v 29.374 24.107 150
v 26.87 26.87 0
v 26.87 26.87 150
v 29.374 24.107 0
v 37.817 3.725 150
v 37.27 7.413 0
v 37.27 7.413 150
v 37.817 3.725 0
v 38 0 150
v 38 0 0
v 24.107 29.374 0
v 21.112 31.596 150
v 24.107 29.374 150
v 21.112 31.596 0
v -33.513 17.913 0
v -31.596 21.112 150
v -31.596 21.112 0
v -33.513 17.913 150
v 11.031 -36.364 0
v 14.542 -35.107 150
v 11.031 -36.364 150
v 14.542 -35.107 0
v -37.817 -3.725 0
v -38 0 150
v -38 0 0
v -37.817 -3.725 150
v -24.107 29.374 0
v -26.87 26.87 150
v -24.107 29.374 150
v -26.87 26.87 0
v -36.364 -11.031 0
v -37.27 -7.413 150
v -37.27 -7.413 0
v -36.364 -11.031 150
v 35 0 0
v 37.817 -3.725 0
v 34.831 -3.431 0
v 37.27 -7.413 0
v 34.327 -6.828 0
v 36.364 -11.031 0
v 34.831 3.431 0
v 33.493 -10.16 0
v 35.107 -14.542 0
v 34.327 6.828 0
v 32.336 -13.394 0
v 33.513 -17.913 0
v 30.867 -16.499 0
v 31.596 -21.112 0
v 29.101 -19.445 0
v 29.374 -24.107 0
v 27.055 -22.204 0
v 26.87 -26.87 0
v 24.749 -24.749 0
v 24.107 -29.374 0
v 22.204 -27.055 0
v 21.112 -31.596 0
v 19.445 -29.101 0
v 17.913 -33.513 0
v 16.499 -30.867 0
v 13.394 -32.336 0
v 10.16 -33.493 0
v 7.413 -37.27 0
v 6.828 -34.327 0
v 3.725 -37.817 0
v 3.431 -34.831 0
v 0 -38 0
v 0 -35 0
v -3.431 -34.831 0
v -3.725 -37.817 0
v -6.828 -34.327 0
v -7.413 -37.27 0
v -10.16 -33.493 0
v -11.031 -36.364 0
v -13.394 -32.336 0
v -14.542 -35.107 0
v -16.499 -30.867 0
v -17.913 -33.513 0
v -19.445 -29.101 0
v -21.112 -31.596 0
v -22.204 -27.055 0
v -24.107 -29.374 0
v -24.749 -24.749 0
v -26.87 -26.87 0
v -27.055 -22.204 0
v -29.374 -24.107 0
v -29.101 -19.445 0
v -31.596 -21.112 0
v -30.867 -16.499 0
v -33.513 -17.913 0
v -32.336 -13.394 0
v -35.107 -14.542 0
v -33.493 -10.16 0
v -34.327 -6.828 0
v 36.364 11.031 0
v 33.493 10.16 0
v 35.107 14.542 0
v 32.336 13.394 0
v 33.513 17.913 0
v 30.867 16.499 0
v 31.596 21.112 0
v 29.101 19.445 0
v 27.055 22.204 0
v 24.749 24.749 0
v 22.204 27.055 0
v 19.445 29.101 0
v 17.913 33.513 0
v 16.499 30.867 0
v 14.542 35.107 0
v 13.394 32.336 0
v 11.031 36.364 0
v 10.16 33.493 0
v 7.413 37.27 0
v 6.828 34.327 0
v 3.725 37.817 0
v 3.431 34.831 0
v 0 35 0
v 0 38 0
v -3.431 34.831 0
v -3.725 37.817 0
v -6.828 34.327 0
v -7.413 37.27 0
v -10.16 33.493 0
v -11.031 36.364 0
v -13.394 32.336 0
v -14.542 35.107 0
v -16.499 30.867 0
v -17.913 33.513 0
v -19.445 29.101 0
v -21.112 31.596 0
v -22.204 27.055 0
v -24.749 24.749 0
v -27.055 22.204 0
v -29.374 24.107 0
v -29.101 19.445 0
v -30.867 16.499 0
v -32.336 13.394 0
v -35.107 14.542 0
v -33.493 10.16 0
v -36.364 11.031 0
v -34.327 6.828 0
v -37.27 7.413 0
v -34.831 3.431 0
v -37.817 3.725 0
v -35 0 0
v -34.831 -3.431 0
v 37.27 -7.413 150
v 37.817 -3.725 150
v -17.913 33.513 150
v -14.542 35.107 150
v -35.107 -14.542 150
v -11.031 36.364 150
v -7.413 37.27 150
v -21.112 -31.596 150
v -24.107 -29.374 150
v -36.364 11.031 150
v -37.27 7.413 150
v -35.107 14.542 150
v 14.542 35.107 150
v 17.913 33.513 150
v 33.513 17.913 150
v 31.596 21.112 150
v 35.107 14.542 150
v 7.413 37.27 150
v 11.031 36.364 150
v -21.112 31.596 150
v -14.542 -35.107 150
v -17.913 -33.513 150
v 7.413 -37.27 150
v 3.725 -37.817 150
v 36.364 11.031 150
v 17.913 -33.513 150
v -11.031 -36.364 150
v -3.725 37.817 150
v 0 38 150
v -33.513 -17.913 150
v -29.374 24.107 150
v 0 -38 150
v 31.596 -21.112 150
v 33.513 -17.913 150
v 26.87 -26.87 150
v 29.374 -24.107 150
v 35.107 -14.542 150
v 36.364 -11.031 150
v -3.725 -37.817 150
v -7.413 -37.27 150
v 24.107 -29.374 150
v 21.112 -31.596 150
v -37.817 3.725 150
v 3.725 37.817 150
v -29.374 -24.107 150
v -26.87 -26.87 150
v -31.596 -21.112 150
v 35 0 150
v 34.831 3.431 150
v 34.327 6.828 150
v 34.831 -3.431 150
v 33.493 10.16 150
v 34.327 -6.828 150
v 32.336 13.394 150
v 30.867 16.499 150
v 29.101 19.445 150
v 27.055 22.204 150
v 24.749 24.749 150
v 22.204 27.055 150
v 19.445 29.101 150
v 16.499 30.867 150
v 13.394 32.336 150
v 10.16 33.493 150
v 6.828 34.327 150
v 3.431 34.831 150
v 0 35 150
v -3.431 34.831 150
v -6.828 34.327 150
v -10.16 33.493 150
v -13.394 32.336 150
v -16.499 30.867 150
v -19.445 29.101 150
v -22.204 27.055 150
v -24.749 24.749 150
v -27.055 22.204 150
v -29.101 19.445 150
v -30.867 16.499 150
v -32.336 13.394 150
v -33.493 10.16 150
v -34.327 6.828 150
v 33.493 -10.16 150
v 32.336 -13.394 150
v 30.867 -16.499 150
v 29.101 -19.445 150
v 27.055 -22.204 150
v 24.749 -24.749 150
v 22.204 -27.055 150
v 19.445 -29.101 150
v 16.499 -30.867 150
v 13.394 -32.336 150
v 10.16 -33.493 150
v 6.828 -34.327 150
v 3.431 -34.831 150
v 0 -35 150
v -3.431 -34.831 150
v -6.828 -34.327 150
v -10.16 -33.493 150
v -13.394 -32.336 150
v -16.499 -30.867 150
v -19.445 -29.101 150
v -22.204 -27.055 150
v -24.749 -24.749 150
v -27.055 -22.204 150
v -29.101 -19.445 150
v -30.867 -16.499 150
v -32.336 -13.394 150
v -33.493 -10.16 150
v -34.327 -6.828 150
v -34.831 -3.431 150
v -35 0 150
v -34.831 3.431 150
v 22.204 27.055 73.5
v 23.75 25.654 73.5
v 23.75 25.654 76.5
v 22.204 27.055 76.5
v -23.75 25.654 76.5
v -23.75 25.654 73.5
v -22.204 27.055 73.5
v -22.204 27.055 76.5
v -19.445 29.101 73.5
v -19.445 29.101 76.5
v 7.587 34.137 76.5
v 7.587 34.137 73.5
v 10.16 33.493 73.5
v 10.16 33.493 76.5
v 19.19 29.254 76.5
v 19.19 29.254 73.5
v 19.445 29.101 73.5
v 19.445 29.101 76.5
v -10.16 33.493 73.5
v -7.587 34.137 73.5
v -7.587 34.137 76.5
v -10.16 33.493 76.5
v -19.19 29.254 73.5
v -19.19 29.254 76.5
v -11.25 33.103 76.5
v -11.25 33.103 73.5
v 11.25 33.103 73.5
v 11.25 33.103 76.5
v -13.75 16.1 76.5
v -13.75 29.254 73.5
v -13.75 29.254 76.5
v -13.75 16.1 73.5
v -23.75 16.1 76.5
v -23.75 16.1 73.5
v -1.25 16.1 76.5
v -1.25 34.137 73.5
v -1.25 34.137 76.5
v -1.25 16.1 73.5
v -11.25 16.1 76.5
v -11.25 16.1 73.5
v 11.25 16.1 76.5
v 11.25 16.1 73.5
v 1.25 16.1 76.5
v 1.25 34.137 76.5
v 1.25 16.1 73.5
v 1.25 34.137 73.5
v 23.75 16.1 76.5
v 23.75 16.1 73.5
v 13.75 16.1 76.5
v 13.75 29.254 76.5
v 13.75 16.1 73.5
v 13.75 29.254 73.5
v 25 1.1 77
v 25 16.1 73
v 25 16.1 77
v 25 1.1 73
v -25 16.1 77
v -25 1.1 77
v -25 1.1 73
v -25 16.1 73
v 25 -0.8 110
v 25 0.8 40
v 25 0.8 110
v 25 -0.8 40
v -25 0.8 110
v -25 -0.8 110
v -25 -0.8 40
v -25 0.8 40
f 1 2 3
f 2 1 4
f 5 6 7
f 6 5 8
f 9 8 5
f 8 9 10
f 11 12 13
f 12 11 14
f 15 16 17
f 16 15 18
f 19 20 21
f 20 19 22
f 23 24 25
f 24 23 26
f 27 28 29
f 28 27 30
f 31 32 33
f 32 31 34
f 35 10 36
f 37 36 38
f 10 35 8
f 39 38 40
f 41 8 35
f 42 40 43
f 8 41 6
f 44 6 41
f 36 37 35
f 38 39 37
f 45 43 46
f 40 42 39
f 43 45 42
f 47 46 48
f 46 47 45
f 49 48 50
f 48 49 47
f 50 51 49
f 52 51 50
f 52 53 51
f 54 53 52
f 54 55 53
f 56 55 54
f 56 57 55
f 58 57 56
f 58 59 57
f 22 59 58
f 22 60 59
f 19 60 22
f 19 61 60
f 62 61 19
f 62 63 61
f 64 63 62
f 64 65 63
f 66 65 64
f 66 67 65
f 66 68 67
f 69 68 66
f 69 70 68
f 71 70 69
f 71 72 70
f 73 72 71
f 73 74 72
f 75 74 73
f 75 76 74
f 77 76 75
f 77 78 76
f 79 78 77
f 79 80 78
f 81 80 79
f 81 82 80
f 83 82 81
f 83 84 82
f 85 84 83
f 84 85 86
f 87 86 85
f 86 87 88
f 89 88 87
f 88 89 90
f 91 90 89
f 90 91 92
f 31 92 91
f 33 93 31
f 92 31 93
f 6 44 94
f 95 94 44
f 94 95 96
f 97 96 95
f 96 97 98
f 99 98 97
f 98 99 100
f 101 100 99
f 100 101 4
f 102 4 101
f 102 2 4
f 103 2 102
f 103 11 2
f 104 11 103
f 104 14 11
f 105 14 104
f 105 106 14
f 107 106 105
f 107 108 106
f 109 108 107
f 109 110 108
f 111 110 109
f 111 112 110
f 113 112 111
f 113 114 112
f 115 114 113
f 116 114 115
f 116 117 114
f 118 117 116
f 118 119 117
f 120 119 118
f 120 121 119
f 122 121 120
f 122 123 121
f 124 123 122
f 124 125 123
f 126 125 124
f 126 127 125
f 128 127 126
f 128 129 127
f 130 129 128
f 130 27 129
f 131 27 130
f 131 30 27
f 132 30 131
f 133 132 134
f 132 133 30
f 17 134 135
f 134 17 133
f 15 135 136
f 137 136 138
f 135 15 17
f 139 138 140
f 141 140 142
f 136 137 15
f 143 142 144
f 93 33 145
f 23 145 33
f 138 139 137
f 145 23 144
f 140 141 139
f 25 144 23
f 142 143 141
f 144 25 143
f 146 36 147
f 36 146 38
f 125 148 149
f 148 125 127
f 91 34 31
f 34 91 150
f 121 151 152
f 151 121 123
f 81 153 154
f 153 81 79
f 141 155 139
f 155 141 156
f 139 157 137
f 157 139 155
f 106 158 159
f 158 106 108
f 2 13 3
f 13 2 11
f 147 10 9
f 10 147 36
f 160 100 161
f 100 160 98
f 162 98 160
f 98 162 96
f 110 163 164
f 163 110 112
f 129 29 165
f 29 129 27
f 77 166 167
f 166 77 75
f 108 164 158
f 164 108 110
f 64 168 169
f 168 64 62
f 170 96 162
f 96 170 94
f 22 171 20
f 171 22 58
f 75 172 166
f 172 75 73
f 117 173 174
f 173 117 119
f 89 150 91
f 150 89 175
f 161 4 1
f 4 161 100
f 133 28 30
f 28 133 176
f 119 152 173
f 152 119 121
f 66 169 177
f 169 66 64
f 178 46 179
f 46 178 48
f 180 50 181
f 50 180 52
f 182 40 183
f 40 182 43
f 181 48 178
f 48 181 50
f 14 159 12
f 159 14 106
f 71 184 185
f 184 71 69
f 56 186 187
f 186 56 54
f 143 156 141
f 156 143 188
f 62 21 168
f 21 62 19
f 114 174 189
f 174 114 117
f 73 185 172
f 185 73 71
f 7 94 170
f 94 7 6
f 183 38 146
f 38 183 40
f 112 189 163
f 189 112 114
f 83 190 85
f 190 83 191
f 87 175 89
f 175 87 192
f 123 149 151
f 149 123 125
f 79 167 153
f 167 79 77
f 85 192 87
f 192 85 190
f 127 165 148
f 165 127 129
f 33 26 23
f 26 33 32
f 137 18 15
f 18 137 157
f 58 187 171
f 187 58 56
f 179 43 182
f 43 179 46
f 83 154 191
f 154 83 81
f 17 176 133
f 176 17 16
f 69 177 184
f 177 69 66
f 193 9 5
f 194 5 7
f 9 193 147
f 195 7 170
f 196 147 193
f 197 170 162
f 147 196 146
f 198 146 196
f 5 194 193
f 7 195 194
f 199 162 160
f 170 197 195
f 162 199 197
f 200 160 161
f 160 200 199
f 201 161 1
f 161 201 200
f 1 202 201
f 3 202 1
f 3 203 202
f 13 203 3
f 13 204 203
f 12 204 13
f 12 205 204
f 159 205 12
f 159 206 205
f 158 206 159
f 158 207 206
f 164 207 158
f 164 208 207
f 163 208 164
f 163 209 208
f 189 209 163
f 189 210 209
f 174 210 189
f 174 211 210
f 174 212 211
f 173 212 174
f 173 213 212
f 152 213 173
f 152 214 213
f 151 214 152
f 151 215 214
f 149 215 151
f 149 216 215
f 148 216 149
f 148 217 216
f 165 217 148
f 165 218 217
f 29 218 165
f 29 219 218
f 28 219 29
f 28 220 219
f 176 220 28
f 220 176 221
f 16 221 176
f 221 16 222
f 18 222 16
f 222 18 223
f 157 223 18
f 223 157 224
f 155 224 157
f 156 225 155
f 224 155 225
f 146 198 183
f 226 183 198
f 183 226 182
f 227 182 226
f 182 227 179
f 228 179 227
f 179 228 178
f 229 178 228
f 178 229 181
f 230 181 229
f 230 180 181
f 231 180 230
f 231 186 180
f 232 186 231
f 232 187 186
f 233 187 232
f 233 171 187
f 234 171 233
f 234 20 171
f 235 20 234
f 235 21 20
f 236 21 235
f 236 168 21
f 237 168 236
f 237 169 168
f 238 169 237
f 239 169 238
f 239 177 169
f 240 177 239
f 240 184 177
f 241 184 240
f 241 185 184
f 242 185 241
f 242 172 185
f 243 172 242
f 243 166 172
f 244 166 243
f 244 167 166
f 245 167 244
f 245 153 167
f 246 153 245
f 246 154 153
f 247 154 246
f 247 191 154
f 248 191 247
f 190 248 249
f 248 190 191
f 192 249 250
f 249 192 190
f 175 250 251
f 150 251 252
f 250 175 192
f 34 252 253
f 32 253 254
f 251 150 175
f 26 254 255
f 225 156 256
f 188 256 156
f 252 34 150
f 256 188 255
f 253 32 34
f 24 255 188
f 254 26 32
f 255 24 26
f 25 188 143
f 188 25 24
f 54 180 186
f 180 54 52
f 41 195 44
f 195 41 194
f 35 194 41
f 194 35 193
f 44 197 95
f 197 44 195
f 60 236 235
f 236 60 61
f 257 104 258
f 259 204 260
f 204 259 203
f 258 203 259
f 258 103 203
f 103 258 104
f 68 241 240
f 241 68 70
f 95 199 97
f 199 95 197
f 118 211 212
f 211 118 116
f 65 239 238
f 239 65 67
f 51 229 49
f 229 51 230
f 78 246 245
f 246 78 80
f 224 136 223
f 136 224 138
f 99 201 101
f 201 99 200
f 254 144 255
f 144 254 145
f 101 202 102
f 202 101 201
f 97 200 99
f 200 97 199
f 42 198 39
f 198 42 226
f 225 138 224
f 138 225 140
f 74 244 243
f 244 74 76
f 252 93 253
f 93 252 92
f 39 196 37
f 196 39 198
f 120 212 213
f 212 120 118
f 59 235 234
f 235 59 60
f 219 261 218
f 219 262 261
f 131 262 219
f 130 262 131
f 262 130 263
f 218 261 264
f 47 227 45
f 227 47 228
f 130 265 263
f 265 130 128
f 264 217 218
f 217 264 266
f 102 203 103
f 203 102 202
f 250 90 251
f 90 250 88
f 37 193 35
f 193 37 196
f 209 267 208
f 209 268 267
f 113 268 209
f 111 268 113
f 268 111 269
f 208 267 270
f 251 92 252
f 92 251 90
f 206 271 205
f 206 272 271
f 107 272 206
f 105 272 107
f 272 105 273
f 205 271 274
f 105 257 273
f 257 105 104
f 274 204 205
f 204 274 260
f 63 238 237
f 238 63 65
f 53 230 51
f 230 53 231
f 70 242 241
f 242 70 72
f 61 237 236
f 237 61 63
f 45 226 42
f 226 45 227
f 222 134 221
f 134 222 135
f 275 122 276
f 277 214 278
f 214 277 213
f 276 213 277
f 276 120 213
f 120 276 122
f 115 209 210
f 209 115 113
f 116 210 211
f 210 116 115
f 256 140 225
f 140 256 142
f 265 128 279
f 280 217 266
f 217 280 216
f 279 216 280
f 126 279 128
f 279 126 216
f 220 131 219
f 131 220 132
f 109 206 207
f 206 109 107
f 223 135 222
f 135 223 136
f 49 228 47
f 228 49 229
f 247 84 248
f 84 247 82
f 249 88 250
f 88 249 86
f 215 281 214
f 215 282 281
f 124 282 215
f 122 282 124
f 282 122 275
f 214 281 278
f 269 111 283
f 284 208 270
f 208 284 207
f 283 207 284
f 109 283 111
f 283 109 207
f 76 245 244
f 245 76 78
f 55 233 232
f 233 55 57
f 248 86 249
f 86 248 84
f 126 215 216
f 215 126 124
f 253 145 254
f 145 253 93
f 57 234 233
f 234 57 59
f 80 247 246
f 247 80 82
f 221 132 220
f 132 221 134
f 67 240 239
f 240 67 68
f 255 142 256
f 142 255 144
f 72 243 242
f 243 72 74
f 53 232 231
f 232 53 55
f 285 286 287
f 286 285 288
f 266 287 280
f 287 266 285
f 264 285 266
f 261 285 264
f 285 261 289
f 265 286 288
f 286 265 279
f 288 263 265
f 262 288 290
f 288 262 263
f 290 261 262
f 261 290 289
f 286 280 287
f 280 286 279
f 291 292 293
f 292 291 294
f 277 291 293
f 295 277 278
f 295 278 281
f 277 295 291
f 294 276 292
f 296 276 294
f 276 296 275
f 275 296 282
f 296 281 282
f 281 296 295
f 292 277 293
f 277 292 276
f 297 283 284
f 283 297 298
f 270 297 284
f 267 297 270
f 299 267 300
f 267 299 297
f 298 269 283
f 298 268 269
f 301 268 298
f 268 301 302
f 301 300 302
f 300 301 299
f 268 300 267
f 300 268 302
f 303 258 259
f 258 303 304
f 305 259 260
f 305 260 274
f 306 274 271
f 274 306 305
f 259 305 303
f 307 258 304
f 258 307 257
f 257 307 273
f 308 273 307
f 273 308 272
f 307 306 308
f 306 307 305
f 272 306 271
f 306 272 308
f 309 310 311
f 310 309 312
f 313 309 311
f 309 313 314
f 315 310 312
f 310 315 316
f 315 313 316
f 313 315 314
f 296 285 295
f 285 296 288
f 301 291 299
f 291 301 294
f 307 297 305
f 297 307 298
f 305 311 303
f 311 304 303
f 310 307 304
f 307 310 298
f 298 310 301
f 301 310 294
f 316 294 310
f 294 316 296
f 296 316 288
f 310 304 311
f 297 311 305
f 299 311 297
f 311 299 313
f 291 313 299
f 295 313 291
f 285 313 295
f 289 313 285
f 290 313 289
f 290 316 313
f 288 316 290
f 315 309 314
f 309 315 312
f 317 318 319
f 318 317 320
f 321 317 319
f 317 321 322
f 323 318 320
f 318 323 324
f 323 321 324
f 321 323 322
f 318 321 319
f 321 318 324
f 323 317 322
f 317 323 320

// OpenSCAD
// tube_enclosure_heatsink.scad — Посох tube electronics bay + internal heatsink
//
// Produced under OPENSCAD_DFM_PROTOCOL.md in response to: "нарисуй мне
// чертеж корпуса под чертеж как платы в посох трубу уместить рассчитай
// диаметр и лепестки теплоотвода прилегающие к трубе. рассчитай сколько
// тепла на макс мощности надо выводить."
//
// Full calculation and citations: hardware/thermal/THERMAL_BUDGET.md.
// No tube diameter existed anywhere in the repo before this file --
// dimensions below are a derived design decision (documented as such,
// not a recovered spec), sized against the z_axis_stack.scad board
// footprint (50x70mm) and a real 6.1W max-power heat budget built from
// this repo's own HackRF/sensor current figures.
//
// ===========================================================================
// 1. Критика и анализ (DFM/DFA)
// ===========================================================================
// - Слабое место А: если плату (50x70мм) ориентировать поперёк круглого
//   сечения трубы, минимальный внутренний диаметр должен перекрывать её
//   диагональ (86.0мм) -- нереалистично толсто для предмета, который
//   держат как посох. Решение: длинная сторона платы (70мм) идёт ВДОЛЬ
//   оси трубы, только ширина (50мм) ограничивает диаметр сечения.
// - Слабое место Б: расчёт (THERMAL_BUDGET.md §3) показывает, что голая
//   труба уже даёт запас по конвекционной площади -- внешние рёбра на
//   наружной поверхности не нужны и были бы избыточным усложнением
//   (Правило 99, Раунд 2: не делай того, что не требуется расчётом).
//   Реальное узкое место -- внутренний тепловой мост от малого корпуса
//   HackRF к стенке трубы, отсюда ступица + "лепестки" внутри, не снаружи.
// - Слабое место В: лепестки должны ПРИЖИМАТЬСЯ к внутренней стенке трубы
//   без зазора (воздушный зазор убивает теплопроводность) -- зазор
//   `petal_fit_clearance` держит посадку скользящей/прессовой, а не
//   "впритык", как и остальные соединения в этом проекте.
//
// ===========================================================================
// 2. Улучшенная архитектура
// ===========================================================================
// Труба (tube_id/tube_od) окружает электронный отсек. Плата (board_width x
// board_length, как в z_axis_stack.scad) лежит вдоль оси трубы на своей
// половине хорды. Теплоотвод -- см. heatsink() ниже -- термически связан с
// алюминиевой подложкой платы под HackRF (см. HARDWARE_INTEGRATION.md:
// "FPGA -> PCB vias -> aluminum backing plate") и передаёт тепло к стенке
// трубы через `petal_count` рёбер, прижимающихся торцами к внутренней
// стенке -- это и есть проводящий тепловой мост, посчитанный в
// THERMAL_BUDGET.md §4 (ΔT ≈ 5°C при полной нагрузке 6.1Вт). Геометрия
// самого моста (накладка + параллельные рёбра, а не диск + радиальные
// лепестки) обновлена версией ниже (2026-09-18, пробная сборка против
// реального стека z_axis_stack.scad) -- см. полное обоснование в
// комментарии прямо над heatsink().

// ===========================================================================
// Global parameters (all dimensions in mm)
// ===========================================================================
$fn = 64;
eps = 0.01;

// Tube (derived in THERMAL_BUDGET.md §2 -- a design decision, not a spec)
tube_id = 70;                 // Board width (50) + 10mm clearance each side
tube_wall = 3;                // Standard structural aluminum tube wall
tube_od = tube_id + 2 * tube_wall;   // 76mm -- "3-inch nominal" stock size
bay_length = 150;             // Electronics-bay length used in the convection check

// Board (matches hardware/cad/z_axis_stack.scad's real footprint)
board_width = 50;             // Spans as a chord across the tube ID
board_length = 70;            // Runs axially along the tube
board_thickness = 1.6;

// Internal heatsink: hub + petals (THERMAL_BUDGET.md §4)
hub_diameter = 30;            // hub_radius = 15mm, per the thermal calc
hub_thickness = 4;
petal_count = 4;
petal_width = 10;             // Circumferential width at the hub
petal_thickness = 3;          // Axial thickness
petal_fit_clearance = 0.3;    // Slightly compressible press-fit against tube ID,
                               // not a bare touch -- keeps real thermal contact
hub_slot_clearance = 0.3;     // Kept for the pad's board-clearance offset below
                               // (renamed in spirit by the 2026-09-18 pad
                               // redesign, see the collision note near
                               // heatsink() -- no longer a slot, a standoff gap)

// ===========================================================================
// Modules
// ===========================================================================

// Tube segment (hollow cylinder) -- the electronics bay only, not the full staff.
module tube_segment() {
    difference() {
        cylinder(h = bay_length, d = tube_od);
        translate([0, 0, -eps])
            cylinder(h = bay_length + 2 * eps, d = tube_id);
    }
}

// PCB, shown as a simple slab (real board outline is a separate BOM/layout
// task -- this is a placement/clearance check, not a fabrication drawing).
// Centered on the tube's own axis (both in X and Y) so its plane coincides
// with the heatsink hub's plane below -- the two are meant to be
// thermally bonded face-to-face, not physically separated across the
// tube's cross-section. Only the axial position (Z) varies along the bay.
module board() {
    translate([-board_width / 2, -board_thickness / 2, (bay_length - board_length) / 2])
        cube([board_width, board_thickness, board_length]);
}

// ===========================================================================
// Collision fix, pass 2 (2026-09-18 trial-assembly pass, part B) --
// OPENSCAD_DFM_PROTOCOL.md step 2 run against the REAL combined
// electronics stack this time, not just this file's own abstract
// board() placeholder. Method: `use <z_axis_stack.scad>` +
// `use <tube_enclosure_heatsink.scad>` in a scratch file, wrap
// base_plate()+standoff()x4+swappable_sled() in one module transformed
// by the coordinate map derived below, then
//   intersection() { electronics_stack(); translate([0,0,bay_length/2]) heatsink(); }
// The centered-disc-with-slot heatsink from pass 1 (see git history)
// rendered non-empty here (44 vertices, 4 volumes) even after clearing
// board()'s own bare slab -- because the *real* stack is not a bare
// slab. z_axis_stack.scad's standoffs (15mm tall) and swappable_sled
// (40mm wide) extend well past the board's own 1.6mm thickness on one
// side only (the M2-standoff/sled side), and a slot sized for the bare
// board doesn't clear them.
//
// Coordinate mapping used to place the real stack in this file's frame
// (board_width=50/board_length=70 identical to z_axis_stack.scad's
// base_width/base_length by construction -- see this file's own header
// comment): z_axis_stack.scad's local frame is (X=width, Y=length,
// Z=height-above-plate). `rotate([90,0,0])` sends local (x,y,z) to
// (x,-z,y); the subsequent `translate([-25,0.8,40])` centers X on the
// tube axis, aligns local Z=0 (base_plate's underside) with this file's
// board()-top face at y=+0.8 (board_thickness/2), and picks bay_length/2
// for the Z position. Net result, confirmed by the bbox math below and
// by Check A (electronics_stack() vs the tube WALL -- empty, no
// interference there): the entire real stack -- base_plate, standoffs,
// sled -- occupies y in [-19.2, +0.8] in this file's frame. Nothing
// about it ever crosses y = +0.8 in the +Y direction; only the bare
// board's opposite face does.
//
// 1. Критика и анализ (DFM/DFA)
// - Слабое место: диск-ступица, отцентрованная на оси платы, требует
//   паза, охватывающего САМУЮ ШИРОКУЮ деталь стека по обе стороны --
//   40мм салазки и 15мм стойки с одной стороны платы. Такой паз занял
//   бы весь диск, оставив от "радиатора" почти ничего. Диагноз в корне
//   неверный: сама идея паза-сквозь-центр предполагает, что деталь
//   тонкая и симметричная, а реальный стек асимметричен -- вся
//   электроника (стойки, салазки) лежит по ОДНУ сторону платы (-Y),
//   противоположная сторона (+Y, "тыльная" сторона платы) весь путь до
//   стенки трубы физически пуста.
//
// 2. Улучшенная архитектура
// Вместо диска, охватывающего плату со всех сторон, радиатор становится
// накладкой (pad), прижатой только к свободной (+Y) стороне платы --
// как в реальных клэмп-радиаторах, которые крепятся к одной открытой
// стороне PCB, а не пытаются охватить компоненты на обеих сторонах.
// Рёбра (fins) идут от накладки прямо к стенке трубы вдоль оси Y --
// не радиально из общего центра, а параллельно друг другу, с длиной,
// рассчитанной по хорде окружности трубы в точке X каждого ребра
// (`sqrt((tube_id/2)^2 - x^2)`), чтобы ни одно ребро не проткнуло
// стенку на кромке платы, где хорда короче, чем на оси.
module heatsink() {
    pad_gap = hub_slot_clearance;      // clearance off the board's bare face
    pad_thickness = hub_thickness;     // reuse the same thermal-contact block height
    pad_y0 = board_thickness / 2 + pad_gap;
    // How far the pad itself extends in +Y before the fins take over.
    // Deliberately well short of hub_diameter (30mm): a pad reaching all
    // the way out to hub_diameter left ~0mm of fin length at the pad's
    // own edge fins once the pad-corner fix (pass 3, below) shrank the
    // pad's half-width to keep it inside the tube -- verified by hand
    // arithmetic while diagnosing that fix, not by guessing a smaller
    // number. 15mm keeps every fin, including the outermost, at a real
    // positive length (>=8mm at the pad's own corner, more toward the
    // tube axis) against tube_id=70/hub_diameter=30.
    pad_reach = 15;

    // Collision fix, pass 3 (same trial-assembly pass, caught by
    // re-checking this module against the tube's own OUTER surface --
    // `intersection() { translate([0,0,bay_length/2]) heatsink();
    // <tube_od-radius cylinder shell>; }`, a check pass 2 never ran
    // because it only verified against board()/electronics_stack(),
    // not the tube itself): a pad spanning the full board_width (50mm)
    // out to y=hub_diameter (30mm) puts its far corners at
    // sqrt(25^2+30^2) ~= 39.1mm from the tube axis -- outside even the
    // tube's OUTER radius (38mm), let alone the inner wall. A flat
    // rectangular pad's corners are always farther from center than its
    // edge midpoints, so sizing it only against the on-axis chord (as
    // the fins already correctly did) under-constrains a rectangle.
    // Fix: clamp the pad's half-width to the tube ID circle at its own
    // Y-reach (`sqrt((tube_id/2)^2 - pad_reach^2)`) instead of reusing
    // board_width, and keep pad_reach itself well inside hub_diameter
    // so there is still real fin length left between the pad and the
    // wall (a pad reaching all the way to hub_diameter would leave the
    // fins at ~0mm length at the board edges -- see the arithmetic in
    // the commit that introduced this fix).
    pad_half_width = min(
        board_width / 2,
        sqrt(pow(tube_id / 2, 2) - pow(pad_reach, 2)) - petal_fit_clearance
    );

    // Pad: a slab against the board's +Y (bare) face -- thermally bonded
    // there per this file's header architecture note (hub <-> HackRF
    // backing plate), never touching the -Y (standoff/sled) side.
    translate([-pad_half_width, pad_y0, -pad_thickness / 2])
        cube([2 * pad_half_width, pad_reach, pad_thickness]);

    // Fins: parallel blocks running further in +Y from the pad's outer
    // face to just short of the tube's inner wall at each fin's own X
    // position -- never radial, so they can never sweep back across
    // the board's plane the way the old petal(angle) pattern did. Each
    // fin's own length is clamped by the tube ID chord at its X
    // position (not just the pad's), so an edge fin is naturally
    // shorter than a center one -- no separate corner check needed
    // here since a 1D line (the fin's centerline) has no "corner" to
    // exceed the radius at, unlike the pad's 2D rectangle above.
    fin_y0 = pad_y0 + pad_reach;
    for (i = [0 : petal_count - 1]) {
        fin_x = -pad_half_width + 2 * pad_half_width * (i + 0.5) / petal_count;
        fin_y_max = sqrt(pow(tube_id / 2, 2) - pow(fin_x, 2)) - petal_fit_clearance;
        translate([fin_x - petal_width / 2, fin_y0 - eps, -petal_thickness / 2])
            cube([
                petal_width,
                fin_y_max - fin_y0 + eps,
                petal_thickness,
            ]);
    }
}

// Full assembly: tube + board + heatsink, positioned to visually verify
// clearances before committing to real material/fab decisions (DFM step 2).
// The heatsink sits at the board's mid-length, directly at the HackRF
// module's location, extending from the board's bare (+Y) face out to
// the tube's inner wall -- an asymmetric pad+fin bridge, not a disc
// centered on the tube axis (see heatsink()'s own 2026-09-18 comment for
// why the on-axis disc was abandoned), but still the same conductive
// path THERMAL_BUDGET.md §4 costs at ΔT ≈ 5°C for 6.1W.
module assembly() {
    color("silver", 0.35)
        tube_segment();

    color("green")
        board();

    translate([0, 0, bay_length / 2])
        color("orange")
        heatsink();
}

// Documentation/DFM-review render only: this repo's software PNG export
// doesn't composite color()'s alpha channel, so a solid tube wall hides
// the board+heatsink entirely from any outside camera angle. Cutting
// away the near half (X > 0) makes the internal layout actually visible
// in a rendered image -- the real (uncut) part is `assembly()` above;
// this wrapper changes nothing about the modeled geometry itself.
// Default false (real, uncut geometry); override with `-D section_view=true`
// to render the longitudinal cutaway, or `-D cross_section_view=true` for a
// thin Z-slab straight down the tube axis (the clearest view of diameter +
// petal layout, the actual "чертеж" this file exists to produce).
section_view = false;
cross_section_view = false;

if (cross_section_view) {
    slab = 5;
    intersection() {
        assembly();
        translate([-tube_od, -tube_od, bay_length / 2 - slab / 2])
            cube([2 * tube_od, 2 * tube_od, slab]);
    }
} else if (section_view) {
    difference() {
        assembly();
        translate([0, -tube_od, -eps])
            cube([tube_od, 2 * tube_od, bay_length + 2 * eps]);
    }
} else {
    assembly();
}
